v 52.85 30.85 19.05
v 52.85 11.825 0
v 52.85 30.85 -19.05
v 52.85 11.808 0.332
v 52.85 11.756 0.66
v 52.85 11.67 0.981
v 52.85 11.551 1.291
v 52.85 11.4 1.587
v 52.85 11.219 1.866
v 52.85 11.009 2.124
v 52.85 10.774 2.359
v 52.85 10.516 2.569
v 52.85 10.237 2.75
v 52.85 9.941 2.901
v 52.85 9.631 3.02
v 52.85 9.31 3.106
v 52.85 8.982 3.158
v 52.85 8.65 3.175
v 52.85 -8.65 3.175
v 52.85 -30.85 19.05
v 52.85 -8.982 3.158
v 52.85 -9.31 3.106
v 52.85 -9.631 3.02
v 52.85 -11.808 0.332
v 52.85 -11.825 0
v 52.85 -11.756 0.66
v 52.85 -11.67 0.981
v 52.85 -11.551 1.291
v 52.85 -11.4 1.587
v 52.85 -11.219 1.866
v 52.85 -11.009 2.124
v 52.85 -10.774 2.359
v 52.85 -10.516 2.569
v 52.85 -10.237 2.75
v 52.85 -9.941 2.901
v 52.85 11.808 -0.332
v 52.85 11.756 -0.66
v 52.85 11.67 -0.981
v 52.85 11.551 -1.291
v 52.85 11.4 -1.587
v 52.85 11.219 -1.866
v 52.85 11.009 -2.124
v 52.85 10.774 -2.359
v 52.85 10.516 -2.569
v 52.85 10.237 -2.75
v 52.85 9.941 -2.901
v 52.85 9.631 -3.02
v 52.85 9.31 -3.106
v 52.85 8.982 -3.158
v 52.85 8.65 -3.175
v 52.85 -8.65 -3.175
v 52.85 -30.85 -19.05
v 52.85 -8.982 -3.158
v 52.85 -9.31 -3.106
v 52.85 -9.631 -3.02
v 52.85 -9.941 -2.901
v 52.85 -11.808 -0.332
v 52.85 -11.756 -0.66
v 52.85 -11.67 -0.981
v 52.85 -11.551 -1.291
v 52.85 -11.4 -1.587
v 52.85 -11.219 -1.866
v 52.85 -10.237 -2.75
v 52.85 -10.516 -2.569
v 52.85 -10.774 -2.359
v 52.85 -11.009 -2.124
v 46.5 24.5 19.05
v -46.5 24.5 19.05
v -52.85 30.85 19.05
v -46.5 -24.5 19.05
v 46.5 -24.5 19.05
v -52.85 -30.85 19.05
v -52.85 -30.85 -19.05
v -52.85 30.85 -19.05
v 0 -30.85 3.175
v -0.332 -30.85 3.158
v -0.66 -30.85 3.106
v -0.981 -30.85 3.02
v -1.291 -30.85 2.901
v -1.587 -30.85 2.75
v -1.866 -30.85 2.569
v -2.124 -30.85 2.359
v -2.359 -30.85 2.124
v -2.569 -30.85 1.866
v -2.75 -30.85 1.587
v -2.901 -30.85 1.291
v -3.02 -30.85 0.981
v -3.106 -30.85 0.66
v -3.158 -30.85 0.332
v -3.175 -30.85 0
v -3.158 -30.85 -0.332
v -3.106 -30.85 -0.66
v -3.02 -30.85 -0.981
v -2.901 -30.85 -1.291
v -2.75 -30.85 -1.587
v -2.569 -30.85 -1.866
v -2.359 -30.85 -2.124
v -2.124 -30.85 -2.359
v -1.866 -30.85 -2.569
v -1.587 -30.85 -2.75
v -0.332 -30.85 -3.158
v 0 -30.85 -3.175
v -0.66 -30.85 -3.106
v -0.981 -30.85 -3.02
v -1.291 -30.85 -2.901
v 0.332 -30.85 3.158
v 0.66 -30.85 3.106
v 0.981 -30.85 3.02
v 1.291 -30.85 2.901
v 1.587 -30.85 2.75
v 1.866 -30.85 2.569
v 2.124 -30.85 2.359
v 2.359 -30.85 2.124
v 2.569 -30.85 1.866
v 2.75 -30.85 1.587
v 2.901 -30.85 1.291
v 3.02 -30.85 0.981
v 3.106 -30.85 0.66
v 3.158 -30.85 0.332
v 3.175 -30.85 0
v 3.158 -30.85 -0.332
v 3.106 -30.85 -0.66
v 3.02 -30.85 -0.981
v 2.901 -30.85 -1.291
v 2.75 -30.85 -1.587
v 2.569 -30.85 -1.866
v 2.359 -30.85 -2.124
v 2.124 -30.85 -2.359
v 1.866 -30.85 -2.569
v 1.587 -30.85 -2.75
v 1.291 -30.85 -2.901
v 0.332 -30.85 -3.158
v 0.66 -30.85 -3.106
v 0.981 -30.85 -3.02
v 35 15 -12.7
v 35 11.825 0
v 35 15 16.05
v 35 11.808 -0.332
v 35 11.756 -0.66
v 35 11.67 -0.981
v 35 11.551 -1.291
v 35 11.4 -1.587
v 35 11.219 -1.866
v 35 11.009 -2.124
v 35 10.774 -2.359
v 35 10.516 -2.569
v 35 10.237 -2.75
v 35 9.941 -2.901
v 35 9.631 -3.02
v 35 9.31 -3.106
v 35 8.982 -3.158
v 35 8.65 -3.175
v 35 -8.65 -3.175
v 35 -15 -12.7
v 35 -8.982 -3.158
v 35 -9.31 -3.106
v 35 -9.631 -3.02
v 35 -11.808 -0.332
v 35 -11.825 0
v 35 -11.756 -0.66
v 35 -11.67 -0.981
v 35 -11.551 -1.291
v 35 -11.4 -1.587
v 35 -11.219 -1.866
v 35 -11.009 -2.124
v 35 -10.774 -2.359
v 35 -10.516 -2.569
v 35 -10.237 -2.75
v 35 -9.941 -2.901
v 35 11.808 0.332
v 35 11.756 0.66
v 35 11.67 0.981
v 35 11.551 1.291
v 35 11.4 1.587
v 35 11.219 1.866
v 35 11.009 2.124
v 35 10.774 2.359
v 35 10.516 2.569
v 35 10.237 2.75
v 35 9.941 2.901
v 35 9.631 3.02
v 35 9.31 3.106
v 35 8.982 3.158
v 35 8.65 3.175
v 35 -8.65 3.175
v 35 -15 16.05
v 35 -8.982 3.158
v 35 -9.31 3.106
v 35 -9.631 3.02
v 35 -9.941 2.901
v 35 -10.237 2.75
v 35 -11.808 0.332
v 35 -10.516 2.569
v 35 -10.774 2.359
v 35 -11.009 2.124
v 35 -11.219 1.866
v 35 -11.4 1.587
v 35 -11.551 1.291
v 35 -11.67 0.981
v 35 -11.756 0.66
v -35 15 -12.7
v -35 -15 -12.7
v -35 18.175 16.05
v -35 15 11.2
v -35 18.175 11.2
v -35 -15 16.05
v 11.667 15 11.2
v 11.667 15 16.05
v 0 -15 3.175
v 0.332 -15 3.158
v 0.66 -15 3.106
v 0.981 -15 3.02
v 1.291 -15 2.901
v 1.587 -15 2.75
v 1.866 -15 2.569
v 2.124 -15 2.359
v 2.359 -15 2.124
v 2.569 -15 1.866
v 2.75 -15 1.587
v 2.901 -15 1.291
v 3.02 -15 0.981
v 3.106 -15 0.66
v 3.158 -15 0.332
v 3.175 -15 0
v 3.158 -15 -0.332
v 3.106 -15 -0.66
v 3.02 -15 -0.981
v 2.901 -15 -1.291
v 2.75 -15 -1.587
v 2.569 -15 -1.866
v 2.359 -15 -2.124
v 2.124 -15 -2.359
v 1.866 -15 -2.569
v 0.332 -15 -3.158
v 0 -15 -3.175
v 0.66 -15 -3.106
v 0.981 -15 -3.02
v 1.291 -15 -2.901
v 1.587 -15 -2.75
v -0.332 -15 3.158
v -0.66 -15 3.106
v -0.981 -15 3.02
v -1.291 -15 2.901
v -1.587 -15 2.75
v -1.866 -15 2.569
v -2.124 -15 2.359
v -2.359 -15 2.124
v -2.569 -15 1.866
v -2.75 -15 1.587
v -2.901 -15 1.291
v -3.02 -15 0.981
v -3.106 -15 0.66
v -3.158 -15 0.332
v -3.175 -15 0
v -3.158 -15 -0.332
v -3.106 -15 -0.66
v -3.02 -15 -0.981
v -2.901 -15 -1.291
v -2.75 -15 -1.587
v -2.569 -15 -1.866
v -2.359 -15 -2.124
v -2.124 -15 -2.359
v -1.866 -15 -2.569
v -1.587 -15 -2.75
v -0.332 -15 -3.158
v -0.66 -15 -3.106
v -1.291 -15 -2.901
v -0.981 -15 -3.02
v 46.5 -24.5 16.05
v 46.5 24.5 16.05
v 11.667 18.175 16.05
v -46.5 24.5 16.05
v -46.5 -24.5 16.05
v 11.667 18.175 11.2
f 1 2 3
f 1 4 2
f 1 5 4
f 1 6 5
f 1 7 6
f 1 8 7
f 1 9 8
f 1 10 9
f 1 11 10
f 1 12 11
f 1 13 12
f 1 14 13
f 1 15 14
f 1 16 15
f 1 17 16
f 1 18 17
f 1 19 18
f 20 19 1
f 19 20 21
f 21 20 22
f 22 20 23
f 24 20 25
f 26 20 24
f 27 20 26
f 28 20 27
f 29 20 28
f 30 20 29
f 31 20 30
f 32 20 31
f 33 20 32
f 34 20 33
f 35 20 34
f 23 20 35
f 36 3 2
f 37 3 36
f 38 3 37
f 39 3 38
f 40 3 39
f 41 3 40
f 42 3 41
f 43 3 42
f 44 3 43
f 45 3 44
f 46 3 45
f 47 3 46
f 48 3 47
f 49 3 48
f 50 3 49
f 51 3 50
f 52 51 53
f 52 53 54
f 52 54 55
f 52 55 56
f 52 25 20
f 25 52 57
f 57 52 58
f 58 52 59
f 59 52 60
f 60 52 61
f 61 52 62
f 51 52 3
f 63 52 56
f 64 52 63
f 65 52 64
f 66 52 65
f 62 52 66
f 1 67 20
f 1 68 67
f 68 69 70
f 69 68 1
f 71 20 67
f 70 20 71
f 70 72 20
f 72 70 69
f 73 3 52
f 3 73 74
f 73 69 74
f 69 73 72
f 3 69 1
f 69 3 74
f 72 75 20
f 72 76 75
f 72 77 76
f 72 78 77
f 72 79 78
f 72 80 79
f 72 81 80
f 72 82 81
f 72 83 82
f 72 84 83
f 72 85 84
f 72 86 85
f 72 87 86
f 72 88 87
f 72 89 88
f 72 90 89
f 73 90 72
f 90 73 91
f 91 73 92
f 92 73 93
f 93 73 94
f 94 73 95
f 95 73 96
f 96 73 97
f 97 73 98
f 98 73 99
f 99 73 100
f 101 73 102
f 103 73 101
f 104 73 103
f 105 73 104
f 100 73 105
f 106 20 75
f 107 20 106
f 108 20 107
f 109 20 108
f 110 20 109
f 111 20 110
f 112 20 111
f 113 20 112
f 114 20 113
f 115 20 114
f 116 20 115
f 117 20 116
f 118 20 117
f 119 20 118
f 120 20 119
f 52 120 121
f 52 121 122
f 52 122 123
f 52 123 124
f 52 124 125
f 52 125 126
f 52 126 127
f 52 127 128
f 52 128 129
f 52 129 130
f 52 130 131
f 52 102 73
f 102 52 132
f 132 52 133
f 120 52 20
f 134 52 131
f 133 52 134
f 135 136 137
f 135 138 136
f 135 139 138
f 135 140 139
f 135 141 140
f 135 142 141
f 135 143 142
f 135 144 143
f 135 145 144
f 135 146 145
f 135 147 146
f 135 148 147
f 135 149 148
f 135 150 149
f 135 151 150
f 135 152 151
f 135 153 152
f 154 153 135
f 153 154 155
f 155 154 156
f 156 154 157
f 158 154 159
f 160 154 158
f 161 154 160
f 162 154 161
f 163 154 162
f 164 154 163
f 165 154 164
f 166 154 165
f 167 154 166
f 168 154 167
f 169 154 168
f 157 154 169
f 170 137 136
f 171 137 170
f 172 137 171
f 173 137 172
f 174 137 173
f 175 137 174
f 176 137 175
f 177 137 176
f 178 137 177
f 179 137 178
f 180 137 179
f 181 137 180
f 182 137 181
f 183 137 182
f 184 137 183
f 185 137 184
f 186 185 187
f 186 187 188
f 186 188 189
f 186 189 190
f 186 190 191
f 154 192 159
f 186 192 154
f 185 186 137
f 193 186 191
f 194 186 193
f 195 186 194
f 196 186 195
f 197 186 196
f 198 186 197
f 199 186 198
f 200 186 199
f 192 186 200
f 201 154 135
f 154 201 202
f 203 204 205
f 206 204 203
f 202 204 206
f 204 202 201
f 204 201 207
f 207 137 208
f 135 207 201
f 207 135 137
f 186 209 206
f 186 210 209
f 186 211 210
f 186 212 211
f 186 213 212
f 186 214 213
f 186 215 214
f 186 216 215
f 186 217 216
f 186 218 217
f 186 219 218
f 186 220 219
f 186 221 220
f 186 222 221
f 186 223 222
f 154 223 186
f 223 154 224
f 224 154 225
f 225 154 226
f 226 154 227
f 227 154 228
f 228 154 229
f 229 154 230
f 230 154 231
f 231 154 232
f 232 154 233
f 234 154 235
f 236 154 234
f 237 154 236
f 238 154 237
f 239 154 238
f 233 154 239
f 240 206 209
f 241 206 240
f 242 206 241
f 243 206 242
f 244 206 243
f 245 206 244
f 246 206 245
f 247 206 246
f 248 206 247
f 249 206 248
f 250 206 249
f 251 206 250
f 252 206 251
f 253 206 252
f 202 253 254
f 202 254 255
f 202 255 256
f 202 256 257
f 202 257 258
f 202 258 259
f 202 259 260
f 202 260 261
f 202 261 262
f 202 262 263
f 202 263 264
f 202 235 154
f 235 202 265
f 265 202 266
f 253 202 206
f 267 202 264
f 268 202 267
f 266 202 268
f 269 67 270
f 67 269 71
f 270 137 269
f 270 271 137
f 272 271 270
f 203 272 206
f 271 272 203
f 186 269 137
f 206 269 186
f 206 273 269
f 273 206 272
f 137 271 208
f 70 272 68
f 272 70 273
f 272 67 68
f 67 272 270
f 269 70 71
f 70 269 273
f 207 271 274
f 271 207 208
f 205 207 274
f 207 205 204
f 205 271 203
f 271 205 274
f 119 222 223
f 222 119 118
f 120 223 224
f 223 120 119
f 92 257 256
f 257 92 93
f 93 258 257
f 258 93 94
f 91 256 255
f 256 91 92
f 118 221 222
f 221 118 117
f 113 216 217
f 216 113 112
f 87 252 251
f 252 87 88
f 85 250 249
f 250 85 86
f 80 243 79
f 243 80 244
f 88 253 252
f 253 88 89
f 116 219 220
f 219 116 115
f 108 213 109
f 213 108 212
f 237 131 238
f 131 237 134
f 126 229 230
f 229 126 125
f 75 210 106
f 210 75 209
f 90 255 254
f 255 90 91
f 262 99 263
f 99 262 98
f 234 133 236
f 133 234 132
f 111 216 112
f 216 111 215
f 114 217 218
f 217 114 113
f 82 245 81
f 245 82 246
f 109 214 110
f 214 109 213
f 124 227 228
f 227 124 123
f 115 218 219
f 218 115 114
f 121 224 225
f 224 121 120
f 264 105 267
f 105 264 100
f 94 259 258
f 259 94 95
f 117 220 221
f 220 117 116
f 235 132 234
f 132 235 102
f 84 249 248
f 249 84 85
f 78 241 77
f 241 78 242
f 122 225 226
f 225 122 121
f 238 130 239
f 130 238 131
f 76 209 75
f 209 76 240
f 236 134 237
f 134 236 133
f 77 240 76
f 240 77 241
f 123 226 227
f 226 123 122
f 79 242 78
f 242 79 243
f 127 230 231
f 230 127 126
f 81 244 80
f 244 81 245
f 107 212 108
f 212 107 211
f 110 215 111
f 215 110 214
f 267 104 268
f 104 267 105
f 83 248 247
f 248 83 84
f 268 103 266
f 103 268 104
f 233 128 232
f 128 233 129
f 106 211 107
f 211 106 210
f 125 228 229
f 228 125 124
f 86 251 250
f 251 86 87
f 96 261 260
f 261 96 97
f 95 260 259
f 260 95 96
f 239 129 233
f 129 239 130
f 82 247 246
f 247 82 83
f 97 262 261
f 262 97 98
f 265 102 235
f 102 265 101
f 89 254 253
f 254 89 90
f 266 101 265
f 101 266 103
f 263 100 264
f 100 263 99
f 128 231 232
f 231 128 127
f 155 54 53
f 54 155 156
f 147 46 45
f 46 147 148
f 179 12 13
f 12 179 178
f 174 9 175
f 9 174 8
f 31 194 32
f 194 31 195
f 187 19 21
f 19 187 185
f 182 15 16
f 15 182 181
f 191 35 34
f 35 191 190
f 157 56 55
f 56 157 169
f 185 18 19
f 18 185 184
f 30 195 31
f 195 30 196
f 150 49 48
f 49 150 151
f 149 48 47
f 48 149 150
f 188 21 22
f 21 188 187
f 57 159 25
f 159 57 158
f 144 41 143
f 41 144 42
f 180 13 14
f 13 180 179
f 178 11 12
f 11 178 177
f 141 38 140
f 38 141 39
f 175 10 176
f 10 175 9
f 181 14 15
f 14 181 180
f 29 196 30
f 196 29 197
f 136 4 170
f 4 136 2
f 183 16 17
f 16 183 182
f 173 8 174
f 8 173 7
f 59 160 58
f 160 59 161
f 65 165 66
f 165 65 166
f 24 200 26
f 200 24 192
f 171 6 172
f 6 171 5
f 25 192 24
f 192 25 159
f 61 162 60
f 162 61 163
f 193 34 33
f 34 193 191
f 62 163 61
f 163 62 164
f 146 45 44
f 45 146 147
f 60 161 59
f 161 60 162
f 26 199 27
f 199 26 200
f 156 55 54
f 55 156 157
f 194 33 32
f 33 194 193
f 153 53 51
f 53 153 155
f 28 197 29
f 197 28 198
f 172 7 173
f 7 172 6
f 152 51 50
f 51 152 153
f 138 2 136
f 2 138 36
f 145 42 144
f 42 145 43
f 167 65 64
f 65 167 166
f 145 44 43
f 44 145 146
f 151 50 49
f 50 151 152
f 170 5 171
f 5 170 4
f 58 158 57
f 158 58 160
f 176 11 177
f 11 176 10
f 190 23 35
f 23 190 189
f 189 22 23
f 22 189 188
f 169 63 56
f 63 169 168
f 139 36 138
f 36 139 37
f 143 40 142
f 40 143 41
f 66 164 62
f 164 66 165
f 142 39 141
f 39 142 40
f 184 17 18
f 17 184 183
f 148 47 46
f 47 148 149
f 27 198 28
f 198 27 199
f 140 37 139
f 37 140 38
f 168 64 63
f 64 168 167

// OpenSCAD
//CNC Tach Case of 2x4 Lumber

//3x7 cm perfboard - adjust to needs
perfx=70;
perfy=30;

//LCD
lcdx=93;
lcdy=49;
lcdcut=3; //quarter of enclosure plus lcd+pcb

wall=6.35; //surround top LCD screen enclosure

encX=lcdx+2*wall;
encY=lcdy+2*wall;
encZ=38.1; //1.5" 

routbit=6.35; //.25" two flute router bit

difference(){
    cube([encX,encY,encZ], center = true);
    //Perfboard w Nano:
    translate([0,0,wall/2]) cube([perfx,perfy,encZ-wall], center=true);
    //Relief for LCD Screen Enclosure:
    translate([0,0,encZ/2-lcdcut/2]) cube([lcdx,lcdy,lcdcut], center=true);
    //Relief for LCD Cable:
    translate([-perfx/6,perfy/2,encZ/2-lcdcut/2-routbit/2]) cube([2*perfx/3,routbit,routbit], center = true);
    //Power In -->Vin:
    translate([0,-encY/4,0]) rotate([90,0,0]) cylinder(d=routbit, h=encY/2, center=true, $fn=60);
    //USB and Sensor cables:
    hull(){ 
        translate([encX/4,perfy/2-routbit,0]) rotate([0,90,0]) cylinder(d=routbit, h=encX/2, center=true, $fn=60);
        translate([encX/4,-(perfy/2-routbit),0]) rotate([0,90,0]) cylinder(d=routbit, h=encX/2, center=true, $fn=60);}
    
}
